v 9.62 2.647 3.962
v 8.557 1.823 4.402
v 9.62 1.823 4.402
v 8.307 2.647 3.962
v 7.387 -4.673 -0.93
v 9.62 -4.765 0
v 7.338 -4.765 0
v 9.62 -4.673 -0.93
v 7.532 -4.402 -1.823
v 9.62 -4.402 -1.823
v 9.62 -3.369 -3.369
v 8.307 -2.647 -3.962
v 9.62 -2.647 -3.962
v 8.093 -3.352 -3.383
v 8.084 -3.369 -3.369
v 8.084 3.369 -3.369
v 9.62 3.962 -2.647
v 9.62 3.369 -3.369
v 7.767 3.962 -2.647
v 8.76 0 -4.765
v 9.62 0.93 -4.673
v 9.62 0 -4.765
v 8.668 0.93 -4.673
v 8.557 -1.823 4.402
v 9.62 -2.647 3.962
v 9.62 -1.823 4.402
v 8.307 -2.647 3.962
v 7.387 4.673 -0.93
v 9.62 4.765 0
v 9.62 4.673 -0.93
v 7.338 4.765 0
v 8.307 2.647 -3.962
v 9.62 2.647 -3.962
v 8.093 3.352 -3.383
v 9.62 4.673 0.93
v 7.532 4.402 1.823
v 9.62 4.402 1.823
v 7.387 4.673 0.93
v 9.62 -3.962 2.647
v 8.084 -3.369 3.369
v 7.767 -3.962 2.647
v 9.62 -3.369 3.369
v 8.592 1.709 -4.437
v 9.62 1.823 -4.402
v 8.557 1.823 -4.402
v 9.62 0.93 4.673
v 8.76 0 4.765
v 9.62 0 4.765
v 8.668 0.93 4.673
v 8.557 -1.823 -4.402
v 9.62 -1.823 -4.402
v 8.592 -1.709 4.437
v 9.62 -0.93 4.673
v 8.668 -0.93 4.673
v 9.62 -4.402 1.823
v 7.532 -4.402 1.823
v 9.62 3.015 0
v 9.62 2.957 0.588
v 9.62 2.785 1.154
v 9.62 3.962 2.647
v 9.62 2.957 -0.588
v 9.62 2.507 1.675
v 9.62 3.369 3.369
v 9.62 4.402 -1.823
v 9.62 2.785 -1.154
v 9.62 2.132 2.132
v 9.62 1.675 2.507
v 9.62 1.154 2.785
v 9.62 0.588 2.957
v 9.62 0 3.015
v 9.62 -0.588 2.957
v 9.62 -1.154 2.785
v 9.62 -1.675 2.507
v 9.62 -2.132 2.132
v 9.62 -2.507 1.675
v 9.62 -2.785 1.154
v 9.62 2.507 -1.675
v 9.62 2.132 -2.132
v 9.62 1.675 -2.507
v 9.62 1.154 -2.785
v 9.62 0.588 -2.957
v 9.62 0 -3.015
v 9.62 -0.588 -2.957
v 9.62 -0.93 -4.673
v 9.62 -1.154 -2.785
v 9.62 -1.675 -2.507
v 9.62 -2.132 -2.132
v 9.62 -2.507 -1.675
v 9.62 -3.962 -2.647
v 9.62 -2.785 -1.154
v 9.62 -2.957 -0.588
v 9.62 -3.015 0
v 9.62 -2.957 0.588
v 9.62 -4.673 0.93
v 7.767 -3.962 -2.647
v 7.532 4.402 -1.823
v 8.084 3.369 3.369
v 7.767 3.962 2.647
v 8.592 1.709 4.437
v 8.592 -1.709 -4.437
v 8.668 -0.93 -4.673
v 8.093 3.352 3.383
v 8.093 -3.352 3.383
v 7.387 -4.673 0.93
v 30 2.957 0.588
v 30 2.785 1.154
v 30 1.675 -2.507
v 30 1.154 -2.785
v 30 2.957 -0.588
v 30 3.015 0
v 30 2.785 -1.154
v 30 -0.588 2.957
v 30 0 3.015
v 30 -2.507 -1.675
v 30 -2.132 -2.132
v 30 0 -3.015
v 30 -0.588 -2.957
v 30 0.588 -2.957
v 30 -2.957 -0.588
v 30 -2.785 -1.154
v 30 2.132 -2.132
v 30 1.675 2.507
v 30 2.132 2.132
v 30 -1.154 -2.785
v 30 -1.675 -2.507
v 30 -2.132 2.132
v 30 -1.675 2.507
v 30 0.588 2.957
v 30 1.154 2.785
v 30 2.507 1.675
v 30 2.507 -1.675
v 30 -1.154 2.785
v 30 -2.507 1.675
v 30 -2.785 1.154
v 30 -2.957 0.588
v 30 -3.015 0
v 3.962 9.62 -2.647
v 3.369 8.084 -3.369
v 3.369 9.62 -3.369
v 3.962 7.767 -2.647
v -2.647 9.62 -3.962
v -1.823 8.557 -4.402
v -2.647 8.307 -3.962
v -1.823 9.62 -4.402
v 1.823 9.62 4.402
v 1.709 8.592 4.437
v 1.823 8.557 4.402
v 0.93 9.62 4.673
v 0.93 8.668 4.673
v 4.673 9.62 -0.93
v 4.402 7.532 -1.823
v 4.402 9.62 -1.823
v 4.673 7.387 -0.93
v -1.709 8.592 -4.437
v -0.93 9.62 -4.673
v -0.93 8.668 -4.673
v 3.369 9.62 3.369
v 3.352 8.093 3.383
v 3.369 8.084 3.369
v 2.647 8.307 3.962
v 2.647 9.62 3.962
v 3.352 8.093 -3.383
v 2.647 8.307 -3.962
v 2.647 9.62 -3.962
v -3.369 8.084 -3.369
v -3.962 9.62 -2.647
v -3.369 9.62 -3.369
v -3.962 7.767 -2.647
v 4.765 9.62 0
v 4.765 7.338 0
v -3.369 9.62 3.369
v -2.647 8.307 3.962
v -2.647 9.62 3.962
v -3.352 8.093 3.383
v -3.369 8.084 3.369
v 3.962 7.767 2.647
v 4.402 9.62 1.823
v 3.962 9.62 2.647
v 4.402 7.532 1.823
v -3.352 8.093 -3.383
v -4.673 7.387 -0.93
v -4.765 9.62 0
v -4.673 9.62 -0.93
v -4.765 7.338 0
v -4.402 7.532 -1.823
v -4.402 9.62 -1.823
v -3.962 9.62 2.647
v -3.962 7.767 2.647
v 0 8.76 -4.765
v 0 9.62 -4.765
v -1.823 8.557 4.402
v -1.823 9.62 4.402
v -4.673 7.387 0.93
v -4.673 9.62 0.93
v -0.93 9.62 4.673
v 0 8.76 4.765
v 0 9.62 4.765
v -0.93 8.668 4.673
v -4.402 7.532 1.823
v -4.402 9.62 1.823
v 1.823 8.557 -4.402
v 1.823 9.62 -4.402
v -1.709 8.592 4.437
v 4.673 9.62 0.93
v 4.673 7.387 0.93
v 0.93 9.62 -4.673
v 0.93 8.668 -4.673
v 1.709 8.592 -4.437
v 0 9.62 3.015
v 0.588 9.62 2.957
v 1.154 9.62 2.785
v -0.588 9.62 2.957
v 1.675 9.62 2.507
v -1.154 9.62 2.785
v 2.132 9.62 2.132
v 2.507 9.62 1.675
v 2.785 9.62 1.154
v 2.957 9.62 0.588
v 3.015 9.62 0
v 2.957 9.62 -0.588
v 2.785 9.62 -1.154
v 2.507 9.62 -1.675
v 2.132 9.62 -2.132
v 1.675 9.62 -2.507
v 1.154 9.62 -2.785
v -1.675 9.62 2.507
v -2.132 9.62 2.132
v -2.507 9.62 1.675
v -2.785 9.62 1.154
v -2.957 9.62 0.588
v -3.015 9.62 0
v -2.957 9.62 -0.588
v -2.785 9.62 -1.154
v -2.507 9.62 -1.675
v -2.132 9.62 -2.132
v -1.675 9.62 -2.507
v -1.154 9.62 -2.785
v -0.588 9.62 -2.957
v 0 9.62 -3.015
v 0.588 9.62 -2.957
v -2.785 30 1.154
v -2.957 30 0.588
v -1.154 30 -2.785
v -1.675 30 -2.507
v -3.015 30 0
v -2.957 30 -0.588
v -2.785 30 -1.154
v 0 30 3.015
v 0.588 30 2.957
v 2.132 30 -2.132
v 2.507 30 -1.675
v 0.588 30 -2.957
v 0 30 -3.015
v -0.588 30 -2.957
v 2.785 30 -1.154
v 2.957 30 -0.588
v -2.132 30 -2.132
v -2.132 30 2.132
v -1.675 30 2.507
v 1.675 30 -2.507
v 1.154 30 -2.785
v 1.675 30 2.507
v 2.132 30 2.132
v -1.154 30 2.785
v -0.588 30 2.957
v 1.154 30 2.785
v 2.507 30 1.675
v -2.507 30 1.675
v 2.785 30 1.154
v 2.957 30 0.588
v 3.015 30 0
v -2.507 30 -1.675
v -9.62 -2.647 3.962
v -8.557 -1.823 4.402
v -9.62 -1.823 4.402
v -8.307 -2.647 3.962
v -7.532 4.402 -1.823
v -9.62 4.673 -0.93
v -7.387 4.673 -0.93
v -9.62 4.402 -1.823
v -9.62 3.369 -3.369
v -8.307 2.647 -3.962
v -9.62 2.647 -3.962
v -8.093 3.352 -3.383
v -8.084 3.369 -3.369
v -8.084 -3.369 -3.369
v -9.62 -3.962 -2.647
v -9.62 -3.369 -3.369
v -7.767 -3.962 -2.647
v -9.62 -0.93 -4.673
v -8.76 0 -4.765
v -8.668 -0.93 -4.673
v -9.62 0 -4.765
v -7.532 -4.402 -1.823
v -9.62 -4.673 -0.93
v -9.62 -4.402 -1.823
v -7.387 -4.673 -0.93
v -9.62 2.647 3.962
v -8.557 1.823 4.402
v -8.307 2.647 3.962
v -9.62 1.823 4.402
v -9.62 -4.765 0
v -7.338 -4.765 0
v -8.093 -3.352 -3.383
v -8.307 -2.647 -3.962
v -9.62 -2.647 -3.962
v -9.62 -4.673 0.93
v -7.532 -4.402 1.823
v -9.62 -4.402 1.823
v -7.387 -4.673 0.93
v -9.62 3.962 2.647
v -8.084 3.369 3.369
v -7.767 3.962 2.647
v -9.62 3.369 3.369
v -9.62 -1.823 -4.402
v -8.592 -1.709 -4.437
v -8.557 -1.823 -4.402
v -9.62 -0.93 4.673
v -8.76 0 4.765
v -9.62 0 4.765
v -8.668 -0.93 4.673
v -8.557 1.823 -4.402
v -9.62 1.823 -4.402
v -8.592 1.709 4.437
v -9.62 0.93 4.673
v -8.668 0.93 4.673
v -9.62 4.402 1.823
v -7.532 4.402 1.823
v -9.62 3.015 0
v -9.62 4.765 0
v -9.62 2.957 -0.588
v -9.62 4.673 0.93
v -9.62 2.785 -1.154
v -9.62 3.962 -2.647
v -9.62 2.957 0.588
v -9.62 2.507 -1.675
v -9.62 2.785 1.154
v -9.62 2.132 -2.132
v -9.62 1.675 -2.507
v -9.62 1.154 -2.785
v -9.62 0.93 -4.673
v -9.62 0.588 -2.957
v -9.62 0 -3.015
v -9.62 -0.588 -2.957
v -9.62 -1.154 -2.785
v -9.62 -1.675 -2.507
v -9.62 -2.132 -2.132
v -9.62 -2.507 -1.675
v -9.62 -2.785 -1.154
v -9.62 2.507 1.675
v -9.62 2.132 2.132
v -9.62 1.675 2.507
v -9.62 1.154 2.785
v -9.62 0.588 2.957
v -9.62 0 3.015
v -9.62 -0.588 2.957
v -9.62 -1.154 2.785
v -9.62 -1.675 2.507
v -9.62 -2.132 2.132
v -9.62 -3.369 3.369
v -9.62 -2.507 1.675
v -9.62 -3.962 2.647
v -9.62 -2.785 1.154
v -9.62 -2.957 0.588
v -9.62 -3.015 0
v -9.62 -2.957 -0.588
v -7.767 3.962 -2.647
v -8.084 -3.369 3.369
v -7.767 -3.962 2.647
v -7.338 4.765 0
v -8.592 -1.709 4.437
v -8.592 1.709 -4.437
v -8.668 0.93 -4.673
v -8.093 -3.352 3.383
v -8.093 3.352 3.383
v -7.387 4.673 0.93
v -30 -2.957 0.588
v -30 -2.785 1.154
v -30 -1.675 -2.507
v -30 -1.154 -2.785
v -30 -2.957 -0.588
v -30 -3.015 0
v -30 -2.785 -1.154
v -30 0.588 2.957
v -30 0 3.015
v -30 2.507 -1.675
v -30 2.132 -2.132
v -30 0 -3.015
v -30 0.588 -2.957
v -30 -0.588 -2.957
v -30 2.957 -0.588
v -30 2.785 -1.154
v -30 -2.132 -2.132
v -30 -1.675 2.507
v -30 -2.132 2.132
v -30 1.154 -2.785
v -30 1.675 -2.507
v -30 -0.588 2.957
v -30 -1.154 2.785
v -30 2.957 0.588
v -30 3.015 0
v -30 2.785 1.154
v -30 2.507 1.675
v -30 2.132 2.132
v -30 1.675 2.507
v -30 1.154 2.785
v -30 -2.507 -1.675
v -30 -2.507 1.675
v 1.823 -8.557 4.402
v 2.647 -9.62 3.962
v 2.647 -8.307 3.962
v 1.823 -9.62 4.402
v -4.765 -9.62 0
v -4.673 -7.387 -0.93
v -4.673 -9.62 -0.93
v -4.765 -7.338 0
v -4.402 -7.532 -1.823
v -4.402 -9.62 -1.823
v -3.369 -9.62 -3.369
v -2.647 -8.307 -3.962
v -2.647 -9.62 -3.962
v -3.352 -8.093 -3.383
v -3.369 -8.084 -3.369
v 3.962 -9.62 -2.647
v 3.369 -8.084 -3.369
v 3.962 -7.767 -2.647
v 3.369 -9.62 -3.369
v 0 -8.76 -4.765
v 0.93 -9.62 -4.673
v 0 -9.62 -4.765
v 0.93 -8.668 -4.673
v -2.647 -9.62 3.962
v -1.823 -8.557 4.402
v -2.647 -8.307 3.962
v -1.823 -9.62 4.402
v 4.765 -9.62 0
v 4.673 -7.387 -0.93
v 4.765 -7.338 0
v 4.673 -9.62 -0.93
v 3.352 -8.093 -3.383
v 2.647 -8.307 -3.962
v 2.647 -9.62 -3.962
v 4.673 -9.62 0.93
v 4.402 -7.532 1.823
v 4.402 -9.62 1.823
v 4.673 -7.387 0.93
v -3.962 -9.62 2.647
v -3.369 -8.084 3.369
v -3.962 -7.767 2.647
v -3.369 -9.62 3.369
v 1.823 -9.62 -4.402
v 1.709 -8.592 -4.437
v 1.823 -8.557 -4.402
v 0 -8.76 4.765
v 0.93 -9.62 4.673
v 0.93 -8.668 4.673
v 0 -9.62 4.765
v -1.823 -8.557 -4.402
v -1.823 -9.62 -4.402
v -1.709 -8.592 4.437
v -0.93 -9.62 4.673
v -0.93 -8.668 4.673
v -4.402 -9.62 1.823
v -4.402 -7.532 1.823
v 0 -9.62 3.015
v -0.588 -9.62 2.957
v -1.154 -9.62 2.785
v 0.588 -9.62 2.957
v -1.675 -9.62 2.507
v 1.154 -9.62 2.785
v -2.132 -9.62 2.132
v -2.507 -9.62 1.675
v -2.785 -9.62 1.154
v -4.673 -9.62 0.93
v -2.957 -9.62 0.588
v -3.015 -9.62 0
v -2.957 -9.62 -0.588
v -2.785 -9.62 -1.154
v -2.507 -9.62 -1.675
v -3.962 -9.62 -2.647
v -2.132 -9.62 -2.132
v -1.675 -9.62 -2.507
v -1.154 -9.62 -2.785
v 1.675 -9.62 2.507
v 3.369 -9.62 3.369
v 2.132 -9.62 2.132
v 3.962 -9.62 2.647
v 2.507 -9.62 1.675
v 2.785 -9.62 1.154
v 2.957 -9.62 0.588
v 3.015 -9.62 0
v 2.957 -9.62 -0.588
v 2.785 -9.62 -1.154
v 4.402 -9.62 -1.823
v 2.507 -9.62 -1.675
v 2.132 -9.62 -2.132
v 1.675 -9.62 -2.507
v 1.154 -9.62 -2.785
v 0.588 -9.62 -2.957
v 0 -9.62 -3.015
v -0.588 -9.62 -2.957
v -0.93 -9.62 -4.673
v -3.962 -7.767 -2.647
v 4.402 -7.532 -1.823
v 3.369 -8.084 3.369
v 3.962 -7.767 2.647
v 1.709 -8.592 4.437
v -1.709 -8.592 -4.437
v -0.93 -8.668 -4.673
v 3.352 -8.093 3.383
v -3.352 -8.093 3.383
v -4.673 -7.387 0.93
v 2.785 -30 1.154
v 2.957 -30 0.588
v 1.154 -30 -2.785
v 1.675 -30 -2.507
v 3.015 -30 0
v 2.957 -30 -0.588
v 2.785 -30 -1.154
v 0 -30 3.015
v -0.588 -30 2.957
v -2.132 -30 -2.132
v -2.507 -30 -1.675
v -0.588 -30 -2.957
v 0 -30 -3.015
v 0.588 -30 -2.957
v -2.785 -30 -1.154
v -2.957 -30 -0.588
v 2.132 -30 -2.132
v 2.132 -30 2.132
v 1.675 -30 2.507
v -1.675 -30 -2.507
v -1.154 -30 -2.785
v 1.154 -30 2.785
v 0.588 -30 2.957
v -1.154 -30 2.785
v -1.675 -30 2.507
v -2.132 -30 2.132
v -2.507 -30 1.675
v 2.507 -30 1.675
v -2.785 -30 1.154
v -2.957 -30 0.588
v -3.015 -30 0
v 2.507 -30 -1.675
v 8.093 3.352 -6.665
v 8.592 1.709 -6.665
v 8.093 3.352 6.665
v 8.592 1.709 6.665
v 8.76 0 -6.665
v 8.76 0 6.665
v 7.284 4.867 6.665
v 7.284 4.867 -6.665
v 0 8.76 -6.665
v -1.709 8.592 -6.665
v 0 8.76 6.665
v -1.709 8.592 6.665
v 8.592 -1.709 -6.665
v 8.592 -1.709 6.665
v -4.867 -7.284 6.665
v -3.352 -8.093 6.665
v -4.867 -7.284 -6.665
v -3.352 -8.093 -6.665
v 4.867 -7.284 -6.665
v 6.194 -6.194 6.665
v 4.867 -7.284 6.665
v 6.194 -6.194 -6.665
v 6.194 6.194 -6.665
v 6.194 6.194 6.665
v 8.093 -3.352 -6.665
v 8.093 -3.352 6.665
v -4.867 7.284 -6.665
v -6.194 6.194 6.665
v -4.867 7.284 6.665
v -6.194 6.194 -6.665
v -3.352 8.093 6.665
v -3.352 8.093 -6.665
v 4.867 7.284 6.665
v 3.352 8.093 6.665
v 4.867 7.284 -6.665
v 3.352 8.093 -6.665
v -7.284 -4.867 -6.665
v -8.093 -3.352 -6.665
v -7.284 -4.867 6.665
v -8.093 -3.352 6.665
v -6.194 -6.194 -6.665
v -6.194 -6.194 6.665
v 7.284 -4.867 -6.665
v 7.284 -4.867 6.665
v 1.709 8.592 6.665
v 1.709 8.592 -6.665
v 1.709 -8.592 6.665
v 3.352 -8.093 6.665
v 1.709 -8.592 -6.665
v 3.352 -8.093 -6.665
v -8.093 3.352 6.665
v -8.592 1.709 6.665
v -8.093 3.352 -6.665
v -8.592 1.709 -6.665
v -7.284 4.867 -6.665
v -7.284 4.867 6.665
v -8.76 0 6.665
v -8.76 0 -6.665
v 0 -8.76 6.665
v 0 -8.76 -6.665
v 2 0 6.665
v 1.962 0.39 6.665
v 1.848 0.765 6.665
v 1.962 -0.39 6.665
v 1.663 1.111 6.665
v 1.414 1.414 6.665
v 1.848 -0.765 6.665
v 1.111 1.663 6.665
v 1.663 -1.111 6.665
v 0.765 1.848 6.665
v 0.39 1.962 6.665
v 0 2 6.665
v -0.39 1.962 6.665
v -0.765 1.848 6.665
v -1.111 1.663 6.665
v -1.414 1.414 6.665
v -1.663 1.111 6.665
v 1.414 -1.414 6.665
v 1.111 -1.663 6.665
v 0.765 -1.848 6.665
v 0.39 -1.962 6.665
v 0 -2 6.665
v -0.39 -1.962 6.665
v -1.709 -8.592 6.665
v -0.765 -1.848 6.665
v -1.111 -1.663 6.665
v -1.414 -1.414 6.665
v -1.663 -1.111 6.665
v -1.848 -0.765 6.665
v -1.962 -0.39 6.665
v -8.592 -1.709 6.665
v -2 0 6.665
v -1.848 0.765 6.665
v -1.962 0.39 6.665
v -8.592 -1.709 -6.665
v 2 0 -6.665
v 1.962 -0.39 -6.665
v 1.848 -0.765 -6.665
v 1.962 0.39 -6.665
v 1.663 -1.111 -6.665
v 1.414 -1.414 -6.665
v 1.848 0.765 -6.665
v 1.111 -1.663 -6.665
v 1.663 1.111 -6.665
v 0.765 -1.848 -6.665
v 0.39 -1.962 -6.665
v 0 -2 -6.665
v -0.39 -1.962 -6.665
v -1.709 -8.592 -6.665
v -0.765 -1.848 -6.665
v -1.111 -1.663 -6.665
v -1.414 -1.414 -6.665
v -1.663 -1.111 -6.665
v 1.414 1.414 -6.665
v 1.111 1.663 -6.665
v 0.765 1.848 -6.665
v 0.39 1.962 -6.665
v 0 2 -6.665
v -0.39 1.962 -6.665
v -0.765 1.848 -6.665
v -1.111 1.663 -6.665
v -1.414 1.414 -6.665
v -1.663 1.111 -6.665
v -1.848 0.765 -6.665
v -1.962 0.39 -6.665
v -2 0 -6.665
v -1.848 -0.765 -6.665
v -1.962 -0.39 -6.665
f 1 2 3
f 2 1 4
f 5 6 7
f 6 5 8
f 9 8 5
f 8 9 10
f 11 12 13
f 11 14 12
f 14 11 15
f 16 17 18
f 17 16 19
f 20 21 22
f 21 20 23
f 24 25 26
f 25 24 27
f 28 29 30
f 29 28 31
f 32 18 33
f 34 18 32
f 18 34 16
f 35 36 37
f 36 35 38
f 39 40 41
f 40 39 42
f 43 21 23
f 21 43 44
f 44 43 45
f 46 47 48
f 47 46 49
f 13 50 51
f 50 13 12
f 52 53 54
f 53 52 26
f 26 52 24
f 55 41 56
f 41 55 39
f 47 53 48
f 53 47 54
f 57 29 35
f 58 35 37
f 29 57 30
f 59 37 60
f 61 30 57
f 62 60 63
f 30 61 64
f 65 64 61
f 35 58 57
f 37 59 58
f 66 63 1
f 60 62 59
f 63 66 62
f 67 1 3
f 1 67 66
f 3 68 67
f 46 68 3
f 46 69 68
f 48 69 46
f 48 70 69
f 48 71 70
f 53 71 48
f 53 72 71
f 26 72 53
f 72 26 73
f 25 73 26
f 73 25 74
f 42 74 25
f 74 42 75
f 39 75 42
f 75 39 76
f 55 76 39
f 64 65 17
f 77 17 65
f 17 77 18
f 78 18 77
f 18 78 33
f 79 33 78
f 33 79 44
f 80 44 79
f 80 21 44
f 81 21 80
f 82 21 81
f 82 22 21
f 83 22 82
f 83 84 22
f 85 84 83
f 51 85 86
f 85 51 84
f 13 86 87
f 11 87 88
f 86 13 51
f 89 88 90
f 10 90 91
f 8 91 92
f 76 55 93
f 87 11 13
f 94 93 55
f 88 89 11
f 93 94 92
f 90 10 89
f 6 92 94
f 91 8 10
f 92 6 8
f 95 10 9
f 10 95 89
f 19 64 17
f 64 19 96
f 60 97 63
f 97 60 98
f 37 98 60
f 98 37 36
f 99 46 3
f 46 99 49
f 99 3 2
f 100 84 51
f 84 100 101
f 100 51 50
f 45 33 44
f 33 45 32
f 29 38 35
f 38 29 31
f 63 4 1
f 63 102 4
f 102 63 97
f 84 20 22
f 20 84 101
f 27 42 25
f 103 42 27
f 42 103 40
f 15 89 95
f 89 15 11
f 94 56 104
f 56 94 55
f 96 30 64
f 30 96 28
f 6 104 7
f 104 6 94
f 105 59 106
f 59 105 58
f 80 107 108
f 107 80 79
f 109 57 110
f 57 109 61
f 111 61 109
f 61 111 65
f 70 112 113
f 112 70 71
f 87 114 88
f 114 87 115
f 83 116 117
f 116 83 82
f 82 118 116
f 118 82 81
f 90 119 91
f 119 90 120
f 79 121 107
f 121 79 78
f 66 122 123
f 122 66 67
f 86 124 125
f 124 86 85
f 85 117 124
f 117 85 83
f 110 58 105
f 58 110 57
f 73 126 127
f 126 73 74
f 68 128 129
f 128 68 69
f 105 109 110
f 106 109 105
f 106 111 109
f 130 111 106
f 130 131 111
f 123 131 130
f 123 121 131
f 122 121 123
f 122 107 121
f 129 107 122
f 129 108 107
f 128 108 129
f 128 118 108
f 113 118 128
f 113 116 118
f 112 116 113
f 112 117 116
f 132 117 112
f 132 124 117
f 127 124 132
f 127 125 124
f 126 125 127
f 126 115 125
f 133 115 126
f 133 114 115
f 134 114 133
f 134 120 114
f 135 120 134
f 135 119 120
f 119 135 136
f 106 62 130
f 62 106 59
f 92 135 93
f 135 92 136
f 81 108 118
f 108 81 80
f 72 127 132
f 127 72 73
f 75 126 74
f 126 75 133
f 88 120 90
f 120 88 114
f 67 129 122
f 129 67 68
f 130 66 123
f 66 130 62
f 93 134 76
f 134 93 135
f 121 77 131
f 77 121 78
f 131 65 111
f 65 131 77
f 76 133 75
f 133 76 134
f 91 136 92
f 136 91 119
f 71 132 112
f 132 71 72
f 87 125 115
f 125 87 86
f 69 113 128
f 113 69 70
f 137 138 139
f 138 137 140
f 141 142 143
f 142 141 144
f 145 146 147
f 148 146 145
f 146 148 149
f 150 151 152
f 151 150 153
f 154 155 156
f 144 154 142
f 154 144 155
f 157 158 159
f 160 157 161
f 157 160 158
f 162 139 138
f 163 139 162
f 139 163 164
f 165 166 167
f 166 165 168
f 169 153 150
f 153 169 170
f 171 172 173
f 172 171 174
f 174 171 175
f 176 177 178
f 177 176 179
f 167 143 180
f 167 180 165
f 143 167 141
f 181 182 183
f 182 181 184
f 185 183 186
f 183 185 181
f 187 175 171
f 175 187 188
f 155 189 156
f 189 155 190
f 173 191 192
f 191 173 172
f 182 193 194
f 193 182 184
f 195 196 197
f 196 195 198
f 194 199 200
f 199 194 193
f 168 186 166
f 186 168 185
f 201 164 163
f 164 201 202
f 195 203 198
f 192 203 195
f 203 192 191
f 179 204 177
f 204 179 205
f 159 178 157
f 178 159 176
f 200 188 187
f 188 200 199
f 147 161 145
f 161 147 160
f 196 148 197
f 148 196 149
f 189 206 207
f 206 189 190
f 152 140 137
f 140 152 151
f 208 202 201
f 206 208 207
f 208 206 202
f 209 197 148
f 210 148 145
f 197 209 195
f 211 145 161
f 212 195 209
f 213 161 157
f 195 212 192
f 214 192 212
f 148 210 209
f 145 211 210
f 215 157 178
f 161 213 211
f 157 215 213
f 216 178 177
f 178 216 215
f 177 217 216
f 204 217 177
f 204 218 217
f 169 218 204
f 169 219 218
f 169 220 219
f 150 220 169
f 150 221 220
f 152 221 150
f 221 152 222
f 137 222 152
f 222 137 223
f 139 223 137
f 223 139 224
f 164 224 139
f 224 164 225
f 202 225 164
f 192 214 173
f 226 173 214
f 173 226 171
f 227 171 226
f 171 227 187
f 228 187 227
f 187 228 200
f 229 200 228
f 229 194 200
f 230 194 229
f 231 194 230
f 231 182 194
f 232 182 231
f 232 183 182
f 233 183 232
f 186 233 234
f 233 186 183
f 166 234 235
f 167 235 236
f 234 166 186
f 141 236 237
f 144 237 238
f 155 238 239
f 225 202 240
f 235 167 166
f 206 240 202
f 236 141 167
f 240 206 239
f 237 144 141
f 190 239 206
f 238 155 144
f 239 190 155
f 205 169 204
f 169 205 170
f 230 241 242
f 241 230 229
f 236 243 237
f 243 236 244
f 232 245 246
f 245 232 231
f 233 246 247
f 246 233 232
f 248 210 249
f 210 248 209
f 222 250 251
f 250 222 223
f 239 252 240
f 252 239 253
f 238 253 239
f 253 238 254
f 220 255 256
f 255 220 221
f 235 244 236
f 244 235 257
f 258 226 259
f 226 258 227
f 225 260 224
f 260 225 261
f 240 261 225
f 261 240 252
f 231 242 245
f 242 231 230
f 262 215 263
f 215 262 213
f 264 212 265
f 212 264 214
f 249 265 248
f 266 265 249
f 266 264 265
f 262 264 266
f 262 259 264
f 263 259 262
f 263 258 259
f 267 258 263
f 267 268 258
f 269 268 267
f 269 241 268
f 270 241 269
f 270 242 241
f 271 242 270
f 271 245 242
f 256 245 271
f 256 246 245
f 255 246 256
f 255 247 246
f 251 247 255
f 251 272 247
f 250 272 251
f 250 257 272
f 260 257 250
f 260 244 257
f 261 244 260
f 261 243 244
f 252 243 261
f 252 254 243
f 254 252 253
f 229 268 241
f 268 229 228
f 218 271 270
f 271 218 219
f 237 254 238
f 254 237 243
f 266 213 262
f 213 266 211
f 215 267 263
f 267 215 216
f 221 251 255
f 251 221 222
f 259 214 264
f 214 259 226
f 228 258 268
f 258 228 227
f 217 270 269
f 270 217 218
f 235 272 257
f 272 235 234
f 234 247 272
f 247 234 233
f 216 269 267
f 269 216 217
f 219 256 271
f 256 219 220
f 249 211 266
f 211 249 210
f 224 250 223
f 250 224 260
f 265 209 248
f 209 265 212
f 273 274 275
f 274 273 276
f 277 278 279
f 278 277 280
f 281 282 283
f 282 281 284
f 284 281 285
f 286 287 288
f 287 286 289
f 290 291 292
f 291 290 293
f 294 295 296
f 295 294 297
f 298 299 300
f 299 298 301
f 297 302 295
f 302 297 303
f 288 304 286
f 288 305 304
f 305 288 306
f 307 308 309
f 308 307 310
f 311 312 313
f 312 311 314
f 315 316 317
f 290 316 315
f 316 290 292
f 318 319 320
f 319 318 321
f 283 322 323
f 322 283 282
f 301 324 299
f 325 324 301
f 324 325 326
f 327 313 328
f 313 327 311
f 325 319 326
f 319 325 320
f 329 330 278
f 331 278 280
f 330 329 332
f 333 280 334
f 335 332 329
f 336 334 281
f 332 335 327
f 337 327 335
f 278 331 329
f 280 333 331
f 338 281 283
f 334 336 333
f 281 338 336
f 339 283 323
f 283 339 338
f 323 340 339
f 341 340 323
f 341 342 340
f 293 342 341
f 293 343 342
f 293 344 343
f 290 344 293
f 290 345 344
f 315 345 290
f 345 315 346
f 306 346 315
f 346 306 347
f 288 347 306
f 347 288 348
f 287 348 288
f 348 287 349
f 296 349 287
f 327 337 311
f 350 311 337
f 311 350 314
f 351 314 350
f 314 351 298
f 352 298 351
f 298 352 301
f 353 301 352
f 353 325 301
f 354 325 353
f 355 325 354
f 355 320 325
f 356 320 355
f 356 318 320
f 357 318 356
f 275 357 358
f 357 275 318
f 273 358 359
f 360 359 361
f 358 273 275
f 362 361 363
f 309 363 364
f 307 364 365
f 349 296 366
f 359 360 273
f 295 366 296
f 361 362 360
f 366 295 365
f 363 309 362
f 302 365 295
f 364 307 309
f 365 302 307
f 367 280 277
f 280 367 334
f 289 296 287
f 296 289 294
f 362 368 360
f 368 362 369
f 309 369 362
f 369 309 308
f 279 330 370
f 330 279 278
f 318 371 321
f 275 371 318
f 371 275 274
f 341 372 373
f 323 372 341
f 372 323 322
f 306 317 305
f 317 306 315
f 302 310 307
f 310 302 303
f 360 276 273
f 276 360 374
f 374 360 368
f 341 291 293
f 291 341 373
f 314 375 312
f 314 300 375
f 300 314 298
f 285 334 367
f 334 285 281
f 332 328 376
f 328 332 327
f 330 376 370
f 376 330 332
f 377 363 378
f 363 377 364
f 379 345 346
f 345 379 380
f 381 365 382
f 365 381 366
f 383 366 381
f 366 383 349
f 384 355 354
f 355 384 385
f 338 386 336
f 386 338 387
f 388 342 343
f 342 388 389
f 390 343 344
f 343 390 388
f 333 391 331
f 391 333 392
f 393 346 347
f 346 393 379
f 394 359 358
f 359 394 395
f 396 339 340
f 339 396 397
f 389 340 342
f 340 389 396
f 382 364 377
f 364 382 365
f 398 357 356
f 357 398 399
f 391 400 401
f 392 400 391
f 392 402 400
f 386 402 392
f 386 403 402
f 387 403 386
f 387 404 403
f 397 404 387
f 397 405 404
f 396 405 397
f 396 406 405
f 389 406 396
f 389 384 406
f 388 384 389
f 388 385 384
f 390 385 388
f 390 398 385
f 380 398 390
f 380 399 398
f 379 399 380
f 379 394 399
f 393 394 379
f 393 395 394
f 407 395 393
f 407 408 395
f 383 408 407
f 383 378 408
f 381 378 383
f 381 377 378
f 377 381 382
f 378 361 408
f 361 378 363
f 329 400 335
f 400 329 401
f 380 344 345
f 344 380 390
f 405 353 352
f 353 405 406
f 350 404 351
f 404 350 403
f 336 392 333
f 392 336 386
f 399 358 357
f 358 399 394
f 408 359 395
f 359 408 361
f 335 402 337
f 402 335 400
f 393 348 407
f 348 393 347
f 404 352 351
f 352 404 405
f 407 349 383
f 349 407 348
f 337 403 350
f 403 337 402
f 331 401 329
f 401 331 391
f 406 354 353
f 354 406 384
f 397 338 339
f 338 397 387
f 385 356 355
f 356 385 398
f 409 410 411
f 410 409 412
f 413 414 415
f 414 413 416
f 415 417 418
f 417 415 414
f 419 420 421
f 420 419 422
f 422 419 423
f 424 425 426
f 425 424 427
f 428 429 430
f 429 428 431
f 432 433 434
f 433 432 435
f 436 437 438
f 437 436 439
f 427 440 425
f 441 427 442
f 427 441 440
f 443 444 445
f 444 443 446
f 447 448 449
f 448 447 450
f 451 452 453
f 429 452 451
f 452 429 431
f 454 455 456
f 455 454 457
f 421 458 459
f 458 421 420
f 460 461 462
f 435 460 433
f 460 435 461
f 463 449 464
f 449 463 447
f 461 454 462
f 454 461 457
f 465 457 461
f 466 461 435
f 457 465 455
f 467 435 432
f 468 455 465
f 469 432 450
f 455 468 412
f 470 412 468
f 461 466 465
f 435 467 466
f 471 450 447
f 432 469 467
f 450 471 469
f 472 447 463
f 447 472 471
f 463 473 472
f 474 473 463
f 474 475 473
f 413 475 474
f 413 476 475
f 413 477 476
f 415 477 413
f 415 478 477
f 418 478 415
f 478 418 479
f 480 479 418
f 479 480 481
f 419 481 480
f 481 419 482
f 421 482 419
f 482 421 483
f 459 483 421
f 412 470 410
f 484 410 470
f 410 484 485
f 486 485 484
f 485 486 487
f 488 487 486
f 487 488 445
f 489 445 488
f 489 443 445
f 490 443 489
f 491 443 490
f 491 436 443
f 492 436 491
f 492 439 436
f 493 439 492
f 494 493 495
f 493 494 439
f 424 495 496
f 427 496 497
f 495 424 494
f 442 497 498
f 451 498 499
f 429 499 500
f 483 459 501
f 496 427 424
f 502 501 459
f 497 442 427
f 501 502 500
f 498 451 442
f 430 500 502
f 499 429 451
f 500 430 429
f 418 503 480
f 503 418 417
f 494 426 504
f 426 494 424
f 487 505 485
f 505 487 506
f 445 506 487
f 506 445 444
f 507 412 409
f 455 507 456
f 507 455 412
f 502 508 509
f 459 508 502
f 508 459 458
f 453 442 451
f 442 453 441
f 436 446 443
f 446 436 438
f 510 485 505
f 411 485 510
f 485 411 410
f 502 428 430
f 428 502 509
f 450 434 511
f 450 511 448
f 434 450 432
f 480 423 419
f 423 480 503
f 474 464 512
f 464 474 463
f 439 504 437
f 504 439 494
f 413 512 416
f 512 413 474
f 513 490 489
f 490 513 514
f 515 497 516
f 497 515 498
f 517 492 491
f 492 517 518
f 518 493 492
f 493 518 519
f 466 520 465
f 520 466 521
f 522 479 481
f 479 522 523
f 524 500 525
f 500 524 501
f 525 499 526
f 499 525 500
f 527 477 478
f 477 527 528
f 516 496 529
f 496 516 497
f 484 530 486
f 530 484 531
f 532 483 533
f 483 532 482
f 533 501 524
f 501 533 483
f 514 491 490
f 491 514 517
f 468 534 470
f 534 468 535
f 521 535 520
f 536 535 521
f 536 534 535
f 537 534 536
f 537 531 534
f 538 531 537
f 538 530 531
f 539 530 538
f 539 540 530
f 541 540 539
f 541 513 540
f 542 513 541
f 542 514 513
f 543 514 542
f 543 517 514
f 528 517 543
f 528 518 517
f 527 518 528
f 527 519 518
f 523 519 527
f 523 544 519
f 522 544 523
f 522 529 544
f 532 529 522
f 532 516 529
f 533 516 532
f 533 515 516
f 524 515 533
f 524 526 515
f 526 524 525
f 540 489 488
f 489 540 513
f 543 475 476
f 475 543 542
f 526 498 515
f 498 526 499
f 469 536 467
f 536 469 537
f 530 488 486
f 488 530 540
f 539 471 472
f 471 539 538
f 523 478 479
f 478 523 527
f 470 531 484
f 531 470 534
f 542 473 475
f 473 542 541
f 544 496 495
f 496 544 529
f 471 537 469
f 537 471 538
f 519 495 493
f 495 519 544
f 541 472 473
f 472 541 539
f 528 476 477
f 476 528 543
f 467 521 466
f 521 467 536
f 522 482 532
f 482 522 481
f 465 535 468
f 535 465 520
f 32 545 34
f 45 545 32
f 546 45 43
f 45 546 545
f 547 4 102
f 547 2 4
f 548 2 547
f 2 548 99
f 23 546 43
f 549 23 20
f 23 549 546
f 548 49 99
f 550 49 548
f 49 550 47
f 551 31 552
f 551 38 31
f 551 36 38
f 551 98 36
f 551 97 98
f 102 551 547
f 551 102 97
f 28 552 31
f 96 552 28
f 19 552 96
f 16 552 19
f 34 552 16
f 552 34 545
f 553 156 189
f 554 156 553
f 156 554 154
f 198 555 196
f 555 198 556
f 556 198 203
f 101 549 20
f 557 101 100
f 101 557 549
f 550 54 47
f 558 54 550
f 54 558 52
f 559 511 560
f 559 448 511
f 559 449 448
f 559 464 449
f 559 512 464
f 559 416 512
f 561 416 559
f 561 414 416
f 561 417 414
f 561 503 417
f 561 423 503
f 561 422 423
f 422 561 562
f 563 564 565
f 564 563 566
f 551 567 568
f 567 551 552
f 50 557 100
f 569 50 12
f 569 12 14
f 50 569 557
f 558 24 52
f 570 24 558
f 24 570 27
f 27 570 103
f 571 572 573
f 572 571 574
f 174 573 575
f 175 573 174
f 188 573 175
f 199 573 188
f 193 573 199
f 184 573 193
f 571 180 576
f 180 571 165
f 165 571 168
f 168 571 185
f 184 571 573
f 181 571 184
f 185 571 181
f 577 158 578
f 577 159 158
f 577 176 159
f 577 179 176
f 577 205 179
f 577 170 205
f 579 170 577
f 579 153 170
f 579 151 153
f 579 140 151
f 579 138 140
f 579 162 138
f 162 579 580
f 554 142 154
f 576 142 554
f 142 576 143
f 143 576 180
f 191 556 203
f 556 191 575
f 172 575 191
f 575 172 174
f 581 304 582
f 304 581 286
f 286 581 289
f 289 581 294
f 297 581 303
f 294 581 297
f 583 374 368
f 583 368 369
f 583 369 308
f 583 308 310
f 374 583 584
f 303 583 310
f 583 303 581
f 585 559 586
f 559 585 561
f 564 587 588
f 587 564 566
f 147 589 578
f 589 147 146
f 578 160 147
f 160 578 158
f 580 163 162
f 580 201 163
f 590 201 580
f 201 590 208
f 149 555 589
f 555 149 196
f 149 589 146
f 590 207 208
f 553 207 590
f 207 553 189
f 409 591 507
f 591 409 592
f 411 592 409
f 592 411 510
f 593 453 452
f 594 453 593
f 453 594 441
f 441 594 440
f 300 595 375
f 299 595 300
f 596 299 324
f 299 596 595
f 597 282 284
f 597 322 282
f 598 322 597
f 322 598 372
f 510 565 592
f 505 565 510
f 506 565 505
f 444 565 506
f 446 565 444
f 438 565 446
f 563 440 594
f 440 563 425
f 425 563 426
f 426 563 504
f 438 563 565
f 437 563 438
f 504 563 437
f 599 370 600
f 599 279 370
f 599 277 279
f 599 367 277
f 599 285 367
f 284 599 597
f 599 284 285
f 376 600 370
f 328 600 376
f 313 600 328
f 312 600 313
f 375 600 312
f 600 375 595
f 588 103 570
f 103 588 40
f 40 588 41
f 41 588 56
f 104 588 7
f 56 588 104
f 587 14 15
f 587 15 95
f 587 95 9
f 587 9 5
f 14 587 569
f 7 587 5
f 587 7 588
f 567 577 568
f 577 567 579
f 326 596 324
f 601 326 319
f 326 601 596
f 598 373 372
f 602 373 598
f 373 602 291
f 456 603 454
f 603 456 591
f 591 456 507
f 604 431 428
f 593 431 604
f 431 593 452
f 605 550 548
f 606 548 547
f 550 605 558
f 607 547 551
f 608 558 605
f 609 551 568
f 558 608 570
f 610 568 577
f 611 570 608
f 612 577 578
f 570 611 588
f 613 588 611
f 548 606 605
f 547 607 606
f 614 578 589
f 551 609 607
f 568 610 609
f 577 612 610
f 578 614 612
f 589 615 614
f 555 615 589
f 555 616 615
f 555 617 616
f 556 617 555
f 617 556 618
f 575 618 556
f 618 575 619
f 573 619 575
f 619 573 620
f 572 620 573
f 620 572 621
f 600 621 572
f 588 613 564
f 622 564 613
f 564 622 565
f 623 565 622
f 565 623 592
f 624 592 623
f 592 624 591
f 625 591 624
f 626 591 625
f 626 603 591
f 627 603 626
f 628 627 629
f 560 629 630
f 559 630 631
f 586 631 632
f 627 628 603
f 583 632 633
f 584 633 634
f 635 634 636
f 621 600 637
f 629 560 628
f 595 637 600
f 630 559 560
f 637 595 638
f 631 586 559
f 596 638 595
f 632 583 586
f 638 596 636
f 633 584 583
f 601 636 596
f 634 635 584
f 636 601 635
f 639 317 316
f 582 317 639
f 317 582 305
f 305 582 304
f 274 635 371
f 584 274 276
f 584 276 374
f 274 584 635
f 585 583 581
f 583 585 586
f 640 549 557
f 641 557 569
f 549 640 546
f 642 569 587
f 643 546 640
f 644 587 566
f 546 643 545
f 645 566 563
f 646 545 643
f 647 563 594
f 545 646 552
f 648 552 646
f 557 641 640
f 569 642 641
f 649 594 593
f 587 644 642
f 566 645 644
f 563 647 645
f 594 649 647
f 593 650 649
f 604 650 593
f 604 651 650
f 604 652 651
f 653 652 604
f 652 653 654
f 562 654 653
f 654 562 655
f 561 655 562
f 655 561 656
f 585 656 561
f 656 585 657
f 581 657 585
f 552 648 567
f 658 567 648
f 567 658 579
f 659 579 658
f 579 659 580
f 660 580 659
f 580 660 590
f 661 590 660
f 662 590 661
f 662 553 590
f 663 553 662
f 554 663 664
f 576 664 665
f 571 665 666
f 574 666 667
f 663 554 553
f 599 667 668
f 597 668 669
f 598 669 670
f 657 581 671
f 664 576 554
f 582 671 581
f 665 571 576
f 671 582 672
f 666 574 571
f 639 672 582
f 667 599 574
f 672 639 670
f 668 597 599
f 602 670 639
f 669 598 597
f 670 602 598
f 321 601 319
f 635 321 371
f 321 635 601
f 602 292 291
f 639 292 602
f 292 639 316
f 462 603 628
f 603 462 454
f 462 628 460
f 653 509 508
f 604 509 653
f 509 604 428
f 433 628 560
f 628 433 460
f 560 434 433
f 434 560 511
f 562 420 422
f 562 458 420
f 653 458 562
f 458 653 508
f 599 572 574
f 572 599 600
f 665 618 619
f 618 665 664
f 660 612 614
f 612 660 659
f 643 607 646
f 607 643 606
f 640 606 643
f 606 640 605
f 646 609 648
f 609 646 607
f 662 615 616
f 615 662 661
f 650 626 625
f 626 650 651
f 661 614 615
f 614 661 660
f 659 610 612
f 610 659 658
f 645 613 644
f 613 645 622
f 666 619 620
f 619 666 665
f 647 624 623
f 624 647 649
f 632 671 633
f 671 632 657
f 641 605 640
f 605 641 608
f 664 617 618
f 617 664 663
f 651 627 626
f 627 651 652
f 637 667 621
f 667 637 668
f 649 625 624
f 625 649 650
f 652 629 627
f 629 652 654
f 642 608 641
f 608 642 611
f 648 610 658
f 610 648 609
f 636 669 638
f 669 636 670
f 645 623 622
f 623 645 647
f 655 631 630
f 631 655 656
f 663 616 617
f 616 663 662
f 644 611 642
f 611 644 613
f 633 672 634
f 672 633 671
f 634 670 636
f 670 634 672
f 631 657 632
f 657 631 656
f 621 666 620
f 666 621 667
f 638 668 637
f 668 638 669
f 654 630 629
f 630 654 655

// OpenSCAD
$fn = 32;

// ----------------------------------------------------------------------
// Cardan cross: 60 mm span, 9.53 mm trunnions
// ----------------------------------------------------------------------

// --- parameters (mm) ---
journal_d = 9.53;         // trunnion diameter
arm_len = 30;             // trunnion length from the centre
step_r = 3.24;            // step position from the centre
step_d = 6.03;            // journal diameter after the step
hub_d = 17.52;            // hub diameter
hub_h = 13.33;            // hub height
bore_d = 4;               // hub bore

difference() {
  union() {
    /* hub along the joint axis */
    cylinder(h = hub_h, d = hub_d, center = true);
    for (a = [0 : 90 : 270]) rotate([0, 0, a]) {
      /* trunnion, sunk into the hub */
      translate([hub_d / 4, 0, 0]) rotate([0, 90, 0]) cylinder(h = step_r + 2, d = journal_d);
      /* stepped journal out to the tip */
      translate([step_r - 0.5, 0, 0]) rotate([0, 90, 0]) cylinder(h = arm_len + 0.5 - step_r, d = step_d);
    }
  }
  /* lubrication bore through the hub, 2.5 mm clear on both sides */
  translate([0, 0, -hub_h / 2 - 2.5]) cylinder(h = hub_h + 5, d = bore_d);
}
